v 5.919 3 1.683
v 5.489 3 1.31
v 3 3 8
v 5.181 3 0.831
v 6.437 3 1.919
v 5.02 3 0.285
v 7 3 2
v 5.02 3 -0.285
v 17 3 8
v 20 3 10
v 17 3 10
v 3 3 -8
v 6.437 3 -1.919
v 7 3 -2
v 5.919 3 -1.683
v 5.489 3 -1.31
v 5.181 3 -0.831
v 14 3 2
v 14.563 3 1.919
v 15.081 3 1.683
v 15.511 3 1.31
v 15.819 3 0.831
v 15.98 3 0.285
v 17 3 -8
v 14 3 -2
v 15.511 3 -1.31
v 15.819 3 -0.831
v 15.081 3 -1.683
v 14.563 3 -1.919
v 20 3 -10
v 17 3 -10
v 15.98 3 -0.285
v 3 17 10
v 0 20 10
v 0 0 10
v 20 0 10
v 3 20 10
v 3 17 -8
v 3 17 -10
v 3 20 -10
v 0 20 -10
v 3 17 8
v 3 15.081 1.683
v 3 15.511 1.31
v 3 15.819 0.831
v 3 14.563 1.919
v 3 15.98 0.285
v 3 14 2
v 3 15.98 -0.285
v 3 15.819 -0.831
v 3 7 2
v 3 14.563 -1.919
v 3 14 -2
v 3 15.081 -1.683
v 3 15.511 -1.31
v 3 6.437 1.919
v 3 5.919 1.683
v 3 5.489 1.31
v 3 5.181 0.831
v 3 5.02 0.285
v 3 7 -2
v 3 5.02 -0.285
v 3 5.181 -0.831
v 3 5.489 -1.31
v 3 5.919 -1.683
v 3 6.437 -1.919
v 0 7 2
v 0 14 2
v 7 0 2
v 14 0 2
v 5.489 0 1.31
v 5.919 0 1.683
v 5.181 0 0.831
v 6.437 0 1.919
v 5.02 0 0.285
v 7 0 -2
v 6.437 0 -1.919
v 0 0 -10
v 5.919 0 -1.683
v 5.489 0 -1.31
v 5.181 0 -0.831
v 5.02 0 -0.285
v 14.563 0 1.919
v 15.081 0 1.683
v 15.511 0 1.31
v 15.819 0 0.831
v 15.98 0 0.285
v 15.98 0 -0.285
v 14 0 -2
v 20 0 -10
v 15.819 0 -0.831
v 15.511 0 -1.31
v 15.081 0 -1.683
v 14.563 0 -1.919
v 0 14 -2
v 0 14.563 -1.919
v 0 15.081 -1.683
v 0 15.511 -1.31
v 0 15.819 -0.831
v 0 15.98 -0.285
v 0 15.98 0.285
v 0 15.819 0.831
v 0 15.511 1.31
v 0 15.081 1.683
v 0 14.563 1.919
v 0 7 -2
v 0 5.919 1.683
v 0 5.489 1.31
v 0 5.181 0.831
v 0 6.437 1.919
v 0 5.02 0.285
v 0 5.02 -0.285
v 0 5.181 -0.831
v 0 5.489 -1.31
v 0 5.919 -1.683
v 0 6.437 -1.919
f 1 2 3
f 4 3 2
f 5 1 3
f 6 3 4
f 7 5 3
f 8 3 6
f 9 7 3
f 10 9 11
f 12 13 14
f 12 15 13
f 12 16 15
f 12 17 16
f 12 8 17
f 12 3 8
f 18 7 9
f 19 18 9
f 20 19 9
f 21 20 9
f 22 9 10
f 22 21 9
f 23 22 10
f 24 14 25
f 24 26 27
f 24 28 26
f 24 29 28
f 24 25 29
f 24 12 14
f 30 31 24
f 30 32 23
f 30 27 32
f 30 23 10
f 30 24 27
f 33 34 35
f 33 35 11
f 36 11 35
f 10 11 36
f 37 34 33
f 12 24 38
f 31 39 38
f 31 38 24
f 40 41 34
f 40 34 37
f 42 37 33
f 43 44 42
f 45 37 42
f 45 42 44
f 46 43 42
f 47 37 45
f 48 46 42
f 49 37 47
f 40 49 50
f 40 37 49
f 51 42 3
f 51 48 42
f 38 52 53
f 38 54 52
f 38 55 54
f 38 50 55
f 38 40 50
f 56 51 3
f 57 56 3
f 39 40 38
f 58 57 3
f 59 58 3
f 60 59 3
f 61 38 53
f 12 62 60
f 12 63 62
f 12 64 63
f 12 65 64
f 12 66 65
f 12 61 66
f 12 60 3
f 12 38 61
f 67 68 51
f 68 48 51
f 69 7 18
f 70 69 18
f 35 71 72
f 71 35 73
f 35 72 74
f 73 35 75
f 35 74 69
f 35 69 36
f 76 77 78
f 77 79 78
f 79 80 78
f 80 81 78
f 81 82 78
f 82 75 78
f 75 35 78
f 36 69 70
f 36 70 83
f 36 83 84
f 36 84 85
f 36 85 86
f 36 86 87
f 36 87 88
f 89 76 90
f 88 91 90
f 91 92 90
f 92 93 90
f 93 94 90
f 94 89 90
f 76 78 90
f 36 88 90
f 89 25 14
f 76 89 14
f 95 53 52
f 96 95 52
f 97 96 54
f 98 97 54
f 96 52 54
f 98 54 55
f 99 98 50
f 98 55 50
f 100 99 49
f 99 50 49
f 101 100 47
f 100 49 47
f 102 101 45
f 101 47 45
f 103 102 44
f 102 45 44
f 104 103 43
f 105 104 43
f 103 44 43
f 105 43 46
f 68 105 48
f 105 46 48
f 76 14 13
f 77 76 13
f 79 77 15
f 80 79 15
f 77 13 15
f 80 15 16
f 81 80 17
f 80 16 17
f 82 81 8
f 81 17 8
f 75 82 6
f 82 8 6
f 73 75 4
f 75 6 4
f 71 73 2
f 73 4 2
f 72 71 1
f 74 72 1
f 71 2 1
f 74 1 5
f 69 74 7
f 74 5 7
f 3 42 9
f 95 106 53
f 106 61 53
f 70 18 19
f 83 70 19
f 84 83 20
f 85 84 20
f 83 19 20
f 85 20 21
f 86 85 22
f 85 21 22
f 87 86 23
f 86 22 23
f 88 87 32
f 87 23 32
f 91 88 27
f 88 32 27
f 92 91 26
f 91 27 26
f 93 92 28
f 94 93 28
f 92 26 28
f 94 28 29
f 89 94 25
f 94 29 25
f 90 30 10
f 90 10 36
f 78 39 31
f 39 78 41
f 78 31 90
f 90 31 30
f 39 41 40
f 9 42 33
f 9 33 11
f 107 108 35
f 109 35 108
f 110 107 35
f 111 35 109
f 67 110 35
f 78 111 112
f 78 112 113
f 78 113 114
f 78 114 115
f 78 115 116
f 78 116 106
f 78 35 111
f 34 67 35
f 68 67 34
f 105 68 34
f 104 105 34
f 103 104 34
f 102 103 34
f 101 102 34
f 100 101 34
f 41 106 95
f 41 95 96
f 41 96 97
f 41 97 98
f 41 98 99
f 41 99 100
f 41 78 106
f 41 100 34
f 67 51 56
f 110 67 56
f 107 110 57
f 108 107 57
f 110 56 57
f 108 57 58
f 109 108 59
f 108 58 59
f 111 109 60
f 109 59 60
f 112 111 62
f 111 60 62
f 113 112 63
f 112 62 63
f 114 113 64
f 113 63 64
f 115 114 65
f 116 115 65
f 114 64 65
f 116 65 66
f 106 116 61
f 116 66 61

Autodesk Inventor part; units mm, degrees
ref_plane "YZ Plane" through (0, 0, 0) normal (1, 0, 0) x (0, 1, 0)
ref_plane "XZ Plane" through (0, 0, 0) normal (0, 1, 0) x (-1, 0, 0)
ref_plane "XY Plane" through (0, 0, 0) normal (0, 0, 1) x (1, 0, 0)
sketch "Sketch1" plane through (0, 0, 0) normal (0, 0, 1) x (1, 0, 0)
  line L0 (0, 0) -> (0, 20)
  line L1 (0, 0) -> (20, 0)
  line L2 (0, 20) -> (3, 20)
  line L3 (3, 20) -> (3, 17)
  line L4 (3, 17) -> (17, 3)
  line L5 (17, 3) -> (20, 3)
  line L6 (20, 3) -> (20, 0)
  dimension "d0" = 20
  dimension "d1" = 20
  dimension "d2" = 3
  dimension "d3" = 3
  dimension "d4" = 3
  dimension "d5" = 3
extrude "Extrusion1" add sketch "Sketch1" along normal mid plane 20
sketch "Sketch2" plane through (0, 20, 10) normal (0, 1, 0) x (1, 0, 0)
  line L0 (3, 2) -> (17, 2)
  line L1 (17, 2) -> (17, 18)
  line L2 (17, 18) -> (3, 18)
  line L3 (3, 18) -> (3, 2)
  line L4 (0, 0) -> (0, 20) projected
  line L5 (3, 0) -> (3, 20) projected
  line L6 (17, 0) -> (17, 20) projected
  line L7 (3, 20) -> (17, 20) projected
  point P0 (0, 10)
  point P1 (3, 10)
  point P2 (0, 10)
  dimension "d8" = 2
extrude "Extrusion2" cut sketch "Sketch2" against normal up to surface (17 mm away) contours L3 L2 L1 L0
sketch "Sketch3" plane through (17, 3, 10) normal (0, 1, 0) x (1, 0, 0)
  line L0 (-10, 10) -> (-3, 10) construction
  line L1 (-10, 8) -> (-3, 8)
  line L2 (-3, 12) -> (-10, 12)
  arc A0 (-10, 12) -> (-10, 8) centre (-10, 10) ccw
  arc A1 (-3, 8) -> (-3, 12) centre (-3, 10) ccw
  line L3 (-17, 0) -> (-17, 20) projected
  line L4 (-14, 0) -> (-14, 20) projected
  line L5 (3, 0) -> (3, 20) projected
  point P0 (-17, 10)
  point P1 (-6.5, 10)
  point P2 (-17, 10)
  point P3 (-17, 10)
  dimension "d11" = 4
  dimension "d12" = 4
  dimension "d21" = 6
extrude "Extrusion3" cut sketch "Sketch3" against normal through all
sketch "Sketch4" plane through (3, 17, 10) normal (1, 0, 0) x (0, 0, -1)
  line L0 (10, -3) -> (10, -10) construction
  line L1 (8, -3) -> (8, -10)
  line L2 (12, -10) -> (12, -3)
  arc A0 (12, -3) -> (8, -3) centre (10, -3) ccw
  arc A1 (8, -10) -> (12, -10) centre (10, -10) ccw
  line L3 (0, -17) -> (20, -17) projected
  line L4 (0, -14) -> (20, -14) projected
  line L5 (0, 3) -> (20, 3) projected
  point P0 (10, -17)
  point P1 (10, -6.5)
  point P2 (10, -17)
  dimension "d16" = 4
  dimension "d17" = 4
  dimension "d18" = 6
extrude "Extrusion4" cut sketch "Sketch4" against normal through all
equation "\"d1\" = d0"
equation "\"d5\" = d2"
properties part number "GUSSET 2020"
